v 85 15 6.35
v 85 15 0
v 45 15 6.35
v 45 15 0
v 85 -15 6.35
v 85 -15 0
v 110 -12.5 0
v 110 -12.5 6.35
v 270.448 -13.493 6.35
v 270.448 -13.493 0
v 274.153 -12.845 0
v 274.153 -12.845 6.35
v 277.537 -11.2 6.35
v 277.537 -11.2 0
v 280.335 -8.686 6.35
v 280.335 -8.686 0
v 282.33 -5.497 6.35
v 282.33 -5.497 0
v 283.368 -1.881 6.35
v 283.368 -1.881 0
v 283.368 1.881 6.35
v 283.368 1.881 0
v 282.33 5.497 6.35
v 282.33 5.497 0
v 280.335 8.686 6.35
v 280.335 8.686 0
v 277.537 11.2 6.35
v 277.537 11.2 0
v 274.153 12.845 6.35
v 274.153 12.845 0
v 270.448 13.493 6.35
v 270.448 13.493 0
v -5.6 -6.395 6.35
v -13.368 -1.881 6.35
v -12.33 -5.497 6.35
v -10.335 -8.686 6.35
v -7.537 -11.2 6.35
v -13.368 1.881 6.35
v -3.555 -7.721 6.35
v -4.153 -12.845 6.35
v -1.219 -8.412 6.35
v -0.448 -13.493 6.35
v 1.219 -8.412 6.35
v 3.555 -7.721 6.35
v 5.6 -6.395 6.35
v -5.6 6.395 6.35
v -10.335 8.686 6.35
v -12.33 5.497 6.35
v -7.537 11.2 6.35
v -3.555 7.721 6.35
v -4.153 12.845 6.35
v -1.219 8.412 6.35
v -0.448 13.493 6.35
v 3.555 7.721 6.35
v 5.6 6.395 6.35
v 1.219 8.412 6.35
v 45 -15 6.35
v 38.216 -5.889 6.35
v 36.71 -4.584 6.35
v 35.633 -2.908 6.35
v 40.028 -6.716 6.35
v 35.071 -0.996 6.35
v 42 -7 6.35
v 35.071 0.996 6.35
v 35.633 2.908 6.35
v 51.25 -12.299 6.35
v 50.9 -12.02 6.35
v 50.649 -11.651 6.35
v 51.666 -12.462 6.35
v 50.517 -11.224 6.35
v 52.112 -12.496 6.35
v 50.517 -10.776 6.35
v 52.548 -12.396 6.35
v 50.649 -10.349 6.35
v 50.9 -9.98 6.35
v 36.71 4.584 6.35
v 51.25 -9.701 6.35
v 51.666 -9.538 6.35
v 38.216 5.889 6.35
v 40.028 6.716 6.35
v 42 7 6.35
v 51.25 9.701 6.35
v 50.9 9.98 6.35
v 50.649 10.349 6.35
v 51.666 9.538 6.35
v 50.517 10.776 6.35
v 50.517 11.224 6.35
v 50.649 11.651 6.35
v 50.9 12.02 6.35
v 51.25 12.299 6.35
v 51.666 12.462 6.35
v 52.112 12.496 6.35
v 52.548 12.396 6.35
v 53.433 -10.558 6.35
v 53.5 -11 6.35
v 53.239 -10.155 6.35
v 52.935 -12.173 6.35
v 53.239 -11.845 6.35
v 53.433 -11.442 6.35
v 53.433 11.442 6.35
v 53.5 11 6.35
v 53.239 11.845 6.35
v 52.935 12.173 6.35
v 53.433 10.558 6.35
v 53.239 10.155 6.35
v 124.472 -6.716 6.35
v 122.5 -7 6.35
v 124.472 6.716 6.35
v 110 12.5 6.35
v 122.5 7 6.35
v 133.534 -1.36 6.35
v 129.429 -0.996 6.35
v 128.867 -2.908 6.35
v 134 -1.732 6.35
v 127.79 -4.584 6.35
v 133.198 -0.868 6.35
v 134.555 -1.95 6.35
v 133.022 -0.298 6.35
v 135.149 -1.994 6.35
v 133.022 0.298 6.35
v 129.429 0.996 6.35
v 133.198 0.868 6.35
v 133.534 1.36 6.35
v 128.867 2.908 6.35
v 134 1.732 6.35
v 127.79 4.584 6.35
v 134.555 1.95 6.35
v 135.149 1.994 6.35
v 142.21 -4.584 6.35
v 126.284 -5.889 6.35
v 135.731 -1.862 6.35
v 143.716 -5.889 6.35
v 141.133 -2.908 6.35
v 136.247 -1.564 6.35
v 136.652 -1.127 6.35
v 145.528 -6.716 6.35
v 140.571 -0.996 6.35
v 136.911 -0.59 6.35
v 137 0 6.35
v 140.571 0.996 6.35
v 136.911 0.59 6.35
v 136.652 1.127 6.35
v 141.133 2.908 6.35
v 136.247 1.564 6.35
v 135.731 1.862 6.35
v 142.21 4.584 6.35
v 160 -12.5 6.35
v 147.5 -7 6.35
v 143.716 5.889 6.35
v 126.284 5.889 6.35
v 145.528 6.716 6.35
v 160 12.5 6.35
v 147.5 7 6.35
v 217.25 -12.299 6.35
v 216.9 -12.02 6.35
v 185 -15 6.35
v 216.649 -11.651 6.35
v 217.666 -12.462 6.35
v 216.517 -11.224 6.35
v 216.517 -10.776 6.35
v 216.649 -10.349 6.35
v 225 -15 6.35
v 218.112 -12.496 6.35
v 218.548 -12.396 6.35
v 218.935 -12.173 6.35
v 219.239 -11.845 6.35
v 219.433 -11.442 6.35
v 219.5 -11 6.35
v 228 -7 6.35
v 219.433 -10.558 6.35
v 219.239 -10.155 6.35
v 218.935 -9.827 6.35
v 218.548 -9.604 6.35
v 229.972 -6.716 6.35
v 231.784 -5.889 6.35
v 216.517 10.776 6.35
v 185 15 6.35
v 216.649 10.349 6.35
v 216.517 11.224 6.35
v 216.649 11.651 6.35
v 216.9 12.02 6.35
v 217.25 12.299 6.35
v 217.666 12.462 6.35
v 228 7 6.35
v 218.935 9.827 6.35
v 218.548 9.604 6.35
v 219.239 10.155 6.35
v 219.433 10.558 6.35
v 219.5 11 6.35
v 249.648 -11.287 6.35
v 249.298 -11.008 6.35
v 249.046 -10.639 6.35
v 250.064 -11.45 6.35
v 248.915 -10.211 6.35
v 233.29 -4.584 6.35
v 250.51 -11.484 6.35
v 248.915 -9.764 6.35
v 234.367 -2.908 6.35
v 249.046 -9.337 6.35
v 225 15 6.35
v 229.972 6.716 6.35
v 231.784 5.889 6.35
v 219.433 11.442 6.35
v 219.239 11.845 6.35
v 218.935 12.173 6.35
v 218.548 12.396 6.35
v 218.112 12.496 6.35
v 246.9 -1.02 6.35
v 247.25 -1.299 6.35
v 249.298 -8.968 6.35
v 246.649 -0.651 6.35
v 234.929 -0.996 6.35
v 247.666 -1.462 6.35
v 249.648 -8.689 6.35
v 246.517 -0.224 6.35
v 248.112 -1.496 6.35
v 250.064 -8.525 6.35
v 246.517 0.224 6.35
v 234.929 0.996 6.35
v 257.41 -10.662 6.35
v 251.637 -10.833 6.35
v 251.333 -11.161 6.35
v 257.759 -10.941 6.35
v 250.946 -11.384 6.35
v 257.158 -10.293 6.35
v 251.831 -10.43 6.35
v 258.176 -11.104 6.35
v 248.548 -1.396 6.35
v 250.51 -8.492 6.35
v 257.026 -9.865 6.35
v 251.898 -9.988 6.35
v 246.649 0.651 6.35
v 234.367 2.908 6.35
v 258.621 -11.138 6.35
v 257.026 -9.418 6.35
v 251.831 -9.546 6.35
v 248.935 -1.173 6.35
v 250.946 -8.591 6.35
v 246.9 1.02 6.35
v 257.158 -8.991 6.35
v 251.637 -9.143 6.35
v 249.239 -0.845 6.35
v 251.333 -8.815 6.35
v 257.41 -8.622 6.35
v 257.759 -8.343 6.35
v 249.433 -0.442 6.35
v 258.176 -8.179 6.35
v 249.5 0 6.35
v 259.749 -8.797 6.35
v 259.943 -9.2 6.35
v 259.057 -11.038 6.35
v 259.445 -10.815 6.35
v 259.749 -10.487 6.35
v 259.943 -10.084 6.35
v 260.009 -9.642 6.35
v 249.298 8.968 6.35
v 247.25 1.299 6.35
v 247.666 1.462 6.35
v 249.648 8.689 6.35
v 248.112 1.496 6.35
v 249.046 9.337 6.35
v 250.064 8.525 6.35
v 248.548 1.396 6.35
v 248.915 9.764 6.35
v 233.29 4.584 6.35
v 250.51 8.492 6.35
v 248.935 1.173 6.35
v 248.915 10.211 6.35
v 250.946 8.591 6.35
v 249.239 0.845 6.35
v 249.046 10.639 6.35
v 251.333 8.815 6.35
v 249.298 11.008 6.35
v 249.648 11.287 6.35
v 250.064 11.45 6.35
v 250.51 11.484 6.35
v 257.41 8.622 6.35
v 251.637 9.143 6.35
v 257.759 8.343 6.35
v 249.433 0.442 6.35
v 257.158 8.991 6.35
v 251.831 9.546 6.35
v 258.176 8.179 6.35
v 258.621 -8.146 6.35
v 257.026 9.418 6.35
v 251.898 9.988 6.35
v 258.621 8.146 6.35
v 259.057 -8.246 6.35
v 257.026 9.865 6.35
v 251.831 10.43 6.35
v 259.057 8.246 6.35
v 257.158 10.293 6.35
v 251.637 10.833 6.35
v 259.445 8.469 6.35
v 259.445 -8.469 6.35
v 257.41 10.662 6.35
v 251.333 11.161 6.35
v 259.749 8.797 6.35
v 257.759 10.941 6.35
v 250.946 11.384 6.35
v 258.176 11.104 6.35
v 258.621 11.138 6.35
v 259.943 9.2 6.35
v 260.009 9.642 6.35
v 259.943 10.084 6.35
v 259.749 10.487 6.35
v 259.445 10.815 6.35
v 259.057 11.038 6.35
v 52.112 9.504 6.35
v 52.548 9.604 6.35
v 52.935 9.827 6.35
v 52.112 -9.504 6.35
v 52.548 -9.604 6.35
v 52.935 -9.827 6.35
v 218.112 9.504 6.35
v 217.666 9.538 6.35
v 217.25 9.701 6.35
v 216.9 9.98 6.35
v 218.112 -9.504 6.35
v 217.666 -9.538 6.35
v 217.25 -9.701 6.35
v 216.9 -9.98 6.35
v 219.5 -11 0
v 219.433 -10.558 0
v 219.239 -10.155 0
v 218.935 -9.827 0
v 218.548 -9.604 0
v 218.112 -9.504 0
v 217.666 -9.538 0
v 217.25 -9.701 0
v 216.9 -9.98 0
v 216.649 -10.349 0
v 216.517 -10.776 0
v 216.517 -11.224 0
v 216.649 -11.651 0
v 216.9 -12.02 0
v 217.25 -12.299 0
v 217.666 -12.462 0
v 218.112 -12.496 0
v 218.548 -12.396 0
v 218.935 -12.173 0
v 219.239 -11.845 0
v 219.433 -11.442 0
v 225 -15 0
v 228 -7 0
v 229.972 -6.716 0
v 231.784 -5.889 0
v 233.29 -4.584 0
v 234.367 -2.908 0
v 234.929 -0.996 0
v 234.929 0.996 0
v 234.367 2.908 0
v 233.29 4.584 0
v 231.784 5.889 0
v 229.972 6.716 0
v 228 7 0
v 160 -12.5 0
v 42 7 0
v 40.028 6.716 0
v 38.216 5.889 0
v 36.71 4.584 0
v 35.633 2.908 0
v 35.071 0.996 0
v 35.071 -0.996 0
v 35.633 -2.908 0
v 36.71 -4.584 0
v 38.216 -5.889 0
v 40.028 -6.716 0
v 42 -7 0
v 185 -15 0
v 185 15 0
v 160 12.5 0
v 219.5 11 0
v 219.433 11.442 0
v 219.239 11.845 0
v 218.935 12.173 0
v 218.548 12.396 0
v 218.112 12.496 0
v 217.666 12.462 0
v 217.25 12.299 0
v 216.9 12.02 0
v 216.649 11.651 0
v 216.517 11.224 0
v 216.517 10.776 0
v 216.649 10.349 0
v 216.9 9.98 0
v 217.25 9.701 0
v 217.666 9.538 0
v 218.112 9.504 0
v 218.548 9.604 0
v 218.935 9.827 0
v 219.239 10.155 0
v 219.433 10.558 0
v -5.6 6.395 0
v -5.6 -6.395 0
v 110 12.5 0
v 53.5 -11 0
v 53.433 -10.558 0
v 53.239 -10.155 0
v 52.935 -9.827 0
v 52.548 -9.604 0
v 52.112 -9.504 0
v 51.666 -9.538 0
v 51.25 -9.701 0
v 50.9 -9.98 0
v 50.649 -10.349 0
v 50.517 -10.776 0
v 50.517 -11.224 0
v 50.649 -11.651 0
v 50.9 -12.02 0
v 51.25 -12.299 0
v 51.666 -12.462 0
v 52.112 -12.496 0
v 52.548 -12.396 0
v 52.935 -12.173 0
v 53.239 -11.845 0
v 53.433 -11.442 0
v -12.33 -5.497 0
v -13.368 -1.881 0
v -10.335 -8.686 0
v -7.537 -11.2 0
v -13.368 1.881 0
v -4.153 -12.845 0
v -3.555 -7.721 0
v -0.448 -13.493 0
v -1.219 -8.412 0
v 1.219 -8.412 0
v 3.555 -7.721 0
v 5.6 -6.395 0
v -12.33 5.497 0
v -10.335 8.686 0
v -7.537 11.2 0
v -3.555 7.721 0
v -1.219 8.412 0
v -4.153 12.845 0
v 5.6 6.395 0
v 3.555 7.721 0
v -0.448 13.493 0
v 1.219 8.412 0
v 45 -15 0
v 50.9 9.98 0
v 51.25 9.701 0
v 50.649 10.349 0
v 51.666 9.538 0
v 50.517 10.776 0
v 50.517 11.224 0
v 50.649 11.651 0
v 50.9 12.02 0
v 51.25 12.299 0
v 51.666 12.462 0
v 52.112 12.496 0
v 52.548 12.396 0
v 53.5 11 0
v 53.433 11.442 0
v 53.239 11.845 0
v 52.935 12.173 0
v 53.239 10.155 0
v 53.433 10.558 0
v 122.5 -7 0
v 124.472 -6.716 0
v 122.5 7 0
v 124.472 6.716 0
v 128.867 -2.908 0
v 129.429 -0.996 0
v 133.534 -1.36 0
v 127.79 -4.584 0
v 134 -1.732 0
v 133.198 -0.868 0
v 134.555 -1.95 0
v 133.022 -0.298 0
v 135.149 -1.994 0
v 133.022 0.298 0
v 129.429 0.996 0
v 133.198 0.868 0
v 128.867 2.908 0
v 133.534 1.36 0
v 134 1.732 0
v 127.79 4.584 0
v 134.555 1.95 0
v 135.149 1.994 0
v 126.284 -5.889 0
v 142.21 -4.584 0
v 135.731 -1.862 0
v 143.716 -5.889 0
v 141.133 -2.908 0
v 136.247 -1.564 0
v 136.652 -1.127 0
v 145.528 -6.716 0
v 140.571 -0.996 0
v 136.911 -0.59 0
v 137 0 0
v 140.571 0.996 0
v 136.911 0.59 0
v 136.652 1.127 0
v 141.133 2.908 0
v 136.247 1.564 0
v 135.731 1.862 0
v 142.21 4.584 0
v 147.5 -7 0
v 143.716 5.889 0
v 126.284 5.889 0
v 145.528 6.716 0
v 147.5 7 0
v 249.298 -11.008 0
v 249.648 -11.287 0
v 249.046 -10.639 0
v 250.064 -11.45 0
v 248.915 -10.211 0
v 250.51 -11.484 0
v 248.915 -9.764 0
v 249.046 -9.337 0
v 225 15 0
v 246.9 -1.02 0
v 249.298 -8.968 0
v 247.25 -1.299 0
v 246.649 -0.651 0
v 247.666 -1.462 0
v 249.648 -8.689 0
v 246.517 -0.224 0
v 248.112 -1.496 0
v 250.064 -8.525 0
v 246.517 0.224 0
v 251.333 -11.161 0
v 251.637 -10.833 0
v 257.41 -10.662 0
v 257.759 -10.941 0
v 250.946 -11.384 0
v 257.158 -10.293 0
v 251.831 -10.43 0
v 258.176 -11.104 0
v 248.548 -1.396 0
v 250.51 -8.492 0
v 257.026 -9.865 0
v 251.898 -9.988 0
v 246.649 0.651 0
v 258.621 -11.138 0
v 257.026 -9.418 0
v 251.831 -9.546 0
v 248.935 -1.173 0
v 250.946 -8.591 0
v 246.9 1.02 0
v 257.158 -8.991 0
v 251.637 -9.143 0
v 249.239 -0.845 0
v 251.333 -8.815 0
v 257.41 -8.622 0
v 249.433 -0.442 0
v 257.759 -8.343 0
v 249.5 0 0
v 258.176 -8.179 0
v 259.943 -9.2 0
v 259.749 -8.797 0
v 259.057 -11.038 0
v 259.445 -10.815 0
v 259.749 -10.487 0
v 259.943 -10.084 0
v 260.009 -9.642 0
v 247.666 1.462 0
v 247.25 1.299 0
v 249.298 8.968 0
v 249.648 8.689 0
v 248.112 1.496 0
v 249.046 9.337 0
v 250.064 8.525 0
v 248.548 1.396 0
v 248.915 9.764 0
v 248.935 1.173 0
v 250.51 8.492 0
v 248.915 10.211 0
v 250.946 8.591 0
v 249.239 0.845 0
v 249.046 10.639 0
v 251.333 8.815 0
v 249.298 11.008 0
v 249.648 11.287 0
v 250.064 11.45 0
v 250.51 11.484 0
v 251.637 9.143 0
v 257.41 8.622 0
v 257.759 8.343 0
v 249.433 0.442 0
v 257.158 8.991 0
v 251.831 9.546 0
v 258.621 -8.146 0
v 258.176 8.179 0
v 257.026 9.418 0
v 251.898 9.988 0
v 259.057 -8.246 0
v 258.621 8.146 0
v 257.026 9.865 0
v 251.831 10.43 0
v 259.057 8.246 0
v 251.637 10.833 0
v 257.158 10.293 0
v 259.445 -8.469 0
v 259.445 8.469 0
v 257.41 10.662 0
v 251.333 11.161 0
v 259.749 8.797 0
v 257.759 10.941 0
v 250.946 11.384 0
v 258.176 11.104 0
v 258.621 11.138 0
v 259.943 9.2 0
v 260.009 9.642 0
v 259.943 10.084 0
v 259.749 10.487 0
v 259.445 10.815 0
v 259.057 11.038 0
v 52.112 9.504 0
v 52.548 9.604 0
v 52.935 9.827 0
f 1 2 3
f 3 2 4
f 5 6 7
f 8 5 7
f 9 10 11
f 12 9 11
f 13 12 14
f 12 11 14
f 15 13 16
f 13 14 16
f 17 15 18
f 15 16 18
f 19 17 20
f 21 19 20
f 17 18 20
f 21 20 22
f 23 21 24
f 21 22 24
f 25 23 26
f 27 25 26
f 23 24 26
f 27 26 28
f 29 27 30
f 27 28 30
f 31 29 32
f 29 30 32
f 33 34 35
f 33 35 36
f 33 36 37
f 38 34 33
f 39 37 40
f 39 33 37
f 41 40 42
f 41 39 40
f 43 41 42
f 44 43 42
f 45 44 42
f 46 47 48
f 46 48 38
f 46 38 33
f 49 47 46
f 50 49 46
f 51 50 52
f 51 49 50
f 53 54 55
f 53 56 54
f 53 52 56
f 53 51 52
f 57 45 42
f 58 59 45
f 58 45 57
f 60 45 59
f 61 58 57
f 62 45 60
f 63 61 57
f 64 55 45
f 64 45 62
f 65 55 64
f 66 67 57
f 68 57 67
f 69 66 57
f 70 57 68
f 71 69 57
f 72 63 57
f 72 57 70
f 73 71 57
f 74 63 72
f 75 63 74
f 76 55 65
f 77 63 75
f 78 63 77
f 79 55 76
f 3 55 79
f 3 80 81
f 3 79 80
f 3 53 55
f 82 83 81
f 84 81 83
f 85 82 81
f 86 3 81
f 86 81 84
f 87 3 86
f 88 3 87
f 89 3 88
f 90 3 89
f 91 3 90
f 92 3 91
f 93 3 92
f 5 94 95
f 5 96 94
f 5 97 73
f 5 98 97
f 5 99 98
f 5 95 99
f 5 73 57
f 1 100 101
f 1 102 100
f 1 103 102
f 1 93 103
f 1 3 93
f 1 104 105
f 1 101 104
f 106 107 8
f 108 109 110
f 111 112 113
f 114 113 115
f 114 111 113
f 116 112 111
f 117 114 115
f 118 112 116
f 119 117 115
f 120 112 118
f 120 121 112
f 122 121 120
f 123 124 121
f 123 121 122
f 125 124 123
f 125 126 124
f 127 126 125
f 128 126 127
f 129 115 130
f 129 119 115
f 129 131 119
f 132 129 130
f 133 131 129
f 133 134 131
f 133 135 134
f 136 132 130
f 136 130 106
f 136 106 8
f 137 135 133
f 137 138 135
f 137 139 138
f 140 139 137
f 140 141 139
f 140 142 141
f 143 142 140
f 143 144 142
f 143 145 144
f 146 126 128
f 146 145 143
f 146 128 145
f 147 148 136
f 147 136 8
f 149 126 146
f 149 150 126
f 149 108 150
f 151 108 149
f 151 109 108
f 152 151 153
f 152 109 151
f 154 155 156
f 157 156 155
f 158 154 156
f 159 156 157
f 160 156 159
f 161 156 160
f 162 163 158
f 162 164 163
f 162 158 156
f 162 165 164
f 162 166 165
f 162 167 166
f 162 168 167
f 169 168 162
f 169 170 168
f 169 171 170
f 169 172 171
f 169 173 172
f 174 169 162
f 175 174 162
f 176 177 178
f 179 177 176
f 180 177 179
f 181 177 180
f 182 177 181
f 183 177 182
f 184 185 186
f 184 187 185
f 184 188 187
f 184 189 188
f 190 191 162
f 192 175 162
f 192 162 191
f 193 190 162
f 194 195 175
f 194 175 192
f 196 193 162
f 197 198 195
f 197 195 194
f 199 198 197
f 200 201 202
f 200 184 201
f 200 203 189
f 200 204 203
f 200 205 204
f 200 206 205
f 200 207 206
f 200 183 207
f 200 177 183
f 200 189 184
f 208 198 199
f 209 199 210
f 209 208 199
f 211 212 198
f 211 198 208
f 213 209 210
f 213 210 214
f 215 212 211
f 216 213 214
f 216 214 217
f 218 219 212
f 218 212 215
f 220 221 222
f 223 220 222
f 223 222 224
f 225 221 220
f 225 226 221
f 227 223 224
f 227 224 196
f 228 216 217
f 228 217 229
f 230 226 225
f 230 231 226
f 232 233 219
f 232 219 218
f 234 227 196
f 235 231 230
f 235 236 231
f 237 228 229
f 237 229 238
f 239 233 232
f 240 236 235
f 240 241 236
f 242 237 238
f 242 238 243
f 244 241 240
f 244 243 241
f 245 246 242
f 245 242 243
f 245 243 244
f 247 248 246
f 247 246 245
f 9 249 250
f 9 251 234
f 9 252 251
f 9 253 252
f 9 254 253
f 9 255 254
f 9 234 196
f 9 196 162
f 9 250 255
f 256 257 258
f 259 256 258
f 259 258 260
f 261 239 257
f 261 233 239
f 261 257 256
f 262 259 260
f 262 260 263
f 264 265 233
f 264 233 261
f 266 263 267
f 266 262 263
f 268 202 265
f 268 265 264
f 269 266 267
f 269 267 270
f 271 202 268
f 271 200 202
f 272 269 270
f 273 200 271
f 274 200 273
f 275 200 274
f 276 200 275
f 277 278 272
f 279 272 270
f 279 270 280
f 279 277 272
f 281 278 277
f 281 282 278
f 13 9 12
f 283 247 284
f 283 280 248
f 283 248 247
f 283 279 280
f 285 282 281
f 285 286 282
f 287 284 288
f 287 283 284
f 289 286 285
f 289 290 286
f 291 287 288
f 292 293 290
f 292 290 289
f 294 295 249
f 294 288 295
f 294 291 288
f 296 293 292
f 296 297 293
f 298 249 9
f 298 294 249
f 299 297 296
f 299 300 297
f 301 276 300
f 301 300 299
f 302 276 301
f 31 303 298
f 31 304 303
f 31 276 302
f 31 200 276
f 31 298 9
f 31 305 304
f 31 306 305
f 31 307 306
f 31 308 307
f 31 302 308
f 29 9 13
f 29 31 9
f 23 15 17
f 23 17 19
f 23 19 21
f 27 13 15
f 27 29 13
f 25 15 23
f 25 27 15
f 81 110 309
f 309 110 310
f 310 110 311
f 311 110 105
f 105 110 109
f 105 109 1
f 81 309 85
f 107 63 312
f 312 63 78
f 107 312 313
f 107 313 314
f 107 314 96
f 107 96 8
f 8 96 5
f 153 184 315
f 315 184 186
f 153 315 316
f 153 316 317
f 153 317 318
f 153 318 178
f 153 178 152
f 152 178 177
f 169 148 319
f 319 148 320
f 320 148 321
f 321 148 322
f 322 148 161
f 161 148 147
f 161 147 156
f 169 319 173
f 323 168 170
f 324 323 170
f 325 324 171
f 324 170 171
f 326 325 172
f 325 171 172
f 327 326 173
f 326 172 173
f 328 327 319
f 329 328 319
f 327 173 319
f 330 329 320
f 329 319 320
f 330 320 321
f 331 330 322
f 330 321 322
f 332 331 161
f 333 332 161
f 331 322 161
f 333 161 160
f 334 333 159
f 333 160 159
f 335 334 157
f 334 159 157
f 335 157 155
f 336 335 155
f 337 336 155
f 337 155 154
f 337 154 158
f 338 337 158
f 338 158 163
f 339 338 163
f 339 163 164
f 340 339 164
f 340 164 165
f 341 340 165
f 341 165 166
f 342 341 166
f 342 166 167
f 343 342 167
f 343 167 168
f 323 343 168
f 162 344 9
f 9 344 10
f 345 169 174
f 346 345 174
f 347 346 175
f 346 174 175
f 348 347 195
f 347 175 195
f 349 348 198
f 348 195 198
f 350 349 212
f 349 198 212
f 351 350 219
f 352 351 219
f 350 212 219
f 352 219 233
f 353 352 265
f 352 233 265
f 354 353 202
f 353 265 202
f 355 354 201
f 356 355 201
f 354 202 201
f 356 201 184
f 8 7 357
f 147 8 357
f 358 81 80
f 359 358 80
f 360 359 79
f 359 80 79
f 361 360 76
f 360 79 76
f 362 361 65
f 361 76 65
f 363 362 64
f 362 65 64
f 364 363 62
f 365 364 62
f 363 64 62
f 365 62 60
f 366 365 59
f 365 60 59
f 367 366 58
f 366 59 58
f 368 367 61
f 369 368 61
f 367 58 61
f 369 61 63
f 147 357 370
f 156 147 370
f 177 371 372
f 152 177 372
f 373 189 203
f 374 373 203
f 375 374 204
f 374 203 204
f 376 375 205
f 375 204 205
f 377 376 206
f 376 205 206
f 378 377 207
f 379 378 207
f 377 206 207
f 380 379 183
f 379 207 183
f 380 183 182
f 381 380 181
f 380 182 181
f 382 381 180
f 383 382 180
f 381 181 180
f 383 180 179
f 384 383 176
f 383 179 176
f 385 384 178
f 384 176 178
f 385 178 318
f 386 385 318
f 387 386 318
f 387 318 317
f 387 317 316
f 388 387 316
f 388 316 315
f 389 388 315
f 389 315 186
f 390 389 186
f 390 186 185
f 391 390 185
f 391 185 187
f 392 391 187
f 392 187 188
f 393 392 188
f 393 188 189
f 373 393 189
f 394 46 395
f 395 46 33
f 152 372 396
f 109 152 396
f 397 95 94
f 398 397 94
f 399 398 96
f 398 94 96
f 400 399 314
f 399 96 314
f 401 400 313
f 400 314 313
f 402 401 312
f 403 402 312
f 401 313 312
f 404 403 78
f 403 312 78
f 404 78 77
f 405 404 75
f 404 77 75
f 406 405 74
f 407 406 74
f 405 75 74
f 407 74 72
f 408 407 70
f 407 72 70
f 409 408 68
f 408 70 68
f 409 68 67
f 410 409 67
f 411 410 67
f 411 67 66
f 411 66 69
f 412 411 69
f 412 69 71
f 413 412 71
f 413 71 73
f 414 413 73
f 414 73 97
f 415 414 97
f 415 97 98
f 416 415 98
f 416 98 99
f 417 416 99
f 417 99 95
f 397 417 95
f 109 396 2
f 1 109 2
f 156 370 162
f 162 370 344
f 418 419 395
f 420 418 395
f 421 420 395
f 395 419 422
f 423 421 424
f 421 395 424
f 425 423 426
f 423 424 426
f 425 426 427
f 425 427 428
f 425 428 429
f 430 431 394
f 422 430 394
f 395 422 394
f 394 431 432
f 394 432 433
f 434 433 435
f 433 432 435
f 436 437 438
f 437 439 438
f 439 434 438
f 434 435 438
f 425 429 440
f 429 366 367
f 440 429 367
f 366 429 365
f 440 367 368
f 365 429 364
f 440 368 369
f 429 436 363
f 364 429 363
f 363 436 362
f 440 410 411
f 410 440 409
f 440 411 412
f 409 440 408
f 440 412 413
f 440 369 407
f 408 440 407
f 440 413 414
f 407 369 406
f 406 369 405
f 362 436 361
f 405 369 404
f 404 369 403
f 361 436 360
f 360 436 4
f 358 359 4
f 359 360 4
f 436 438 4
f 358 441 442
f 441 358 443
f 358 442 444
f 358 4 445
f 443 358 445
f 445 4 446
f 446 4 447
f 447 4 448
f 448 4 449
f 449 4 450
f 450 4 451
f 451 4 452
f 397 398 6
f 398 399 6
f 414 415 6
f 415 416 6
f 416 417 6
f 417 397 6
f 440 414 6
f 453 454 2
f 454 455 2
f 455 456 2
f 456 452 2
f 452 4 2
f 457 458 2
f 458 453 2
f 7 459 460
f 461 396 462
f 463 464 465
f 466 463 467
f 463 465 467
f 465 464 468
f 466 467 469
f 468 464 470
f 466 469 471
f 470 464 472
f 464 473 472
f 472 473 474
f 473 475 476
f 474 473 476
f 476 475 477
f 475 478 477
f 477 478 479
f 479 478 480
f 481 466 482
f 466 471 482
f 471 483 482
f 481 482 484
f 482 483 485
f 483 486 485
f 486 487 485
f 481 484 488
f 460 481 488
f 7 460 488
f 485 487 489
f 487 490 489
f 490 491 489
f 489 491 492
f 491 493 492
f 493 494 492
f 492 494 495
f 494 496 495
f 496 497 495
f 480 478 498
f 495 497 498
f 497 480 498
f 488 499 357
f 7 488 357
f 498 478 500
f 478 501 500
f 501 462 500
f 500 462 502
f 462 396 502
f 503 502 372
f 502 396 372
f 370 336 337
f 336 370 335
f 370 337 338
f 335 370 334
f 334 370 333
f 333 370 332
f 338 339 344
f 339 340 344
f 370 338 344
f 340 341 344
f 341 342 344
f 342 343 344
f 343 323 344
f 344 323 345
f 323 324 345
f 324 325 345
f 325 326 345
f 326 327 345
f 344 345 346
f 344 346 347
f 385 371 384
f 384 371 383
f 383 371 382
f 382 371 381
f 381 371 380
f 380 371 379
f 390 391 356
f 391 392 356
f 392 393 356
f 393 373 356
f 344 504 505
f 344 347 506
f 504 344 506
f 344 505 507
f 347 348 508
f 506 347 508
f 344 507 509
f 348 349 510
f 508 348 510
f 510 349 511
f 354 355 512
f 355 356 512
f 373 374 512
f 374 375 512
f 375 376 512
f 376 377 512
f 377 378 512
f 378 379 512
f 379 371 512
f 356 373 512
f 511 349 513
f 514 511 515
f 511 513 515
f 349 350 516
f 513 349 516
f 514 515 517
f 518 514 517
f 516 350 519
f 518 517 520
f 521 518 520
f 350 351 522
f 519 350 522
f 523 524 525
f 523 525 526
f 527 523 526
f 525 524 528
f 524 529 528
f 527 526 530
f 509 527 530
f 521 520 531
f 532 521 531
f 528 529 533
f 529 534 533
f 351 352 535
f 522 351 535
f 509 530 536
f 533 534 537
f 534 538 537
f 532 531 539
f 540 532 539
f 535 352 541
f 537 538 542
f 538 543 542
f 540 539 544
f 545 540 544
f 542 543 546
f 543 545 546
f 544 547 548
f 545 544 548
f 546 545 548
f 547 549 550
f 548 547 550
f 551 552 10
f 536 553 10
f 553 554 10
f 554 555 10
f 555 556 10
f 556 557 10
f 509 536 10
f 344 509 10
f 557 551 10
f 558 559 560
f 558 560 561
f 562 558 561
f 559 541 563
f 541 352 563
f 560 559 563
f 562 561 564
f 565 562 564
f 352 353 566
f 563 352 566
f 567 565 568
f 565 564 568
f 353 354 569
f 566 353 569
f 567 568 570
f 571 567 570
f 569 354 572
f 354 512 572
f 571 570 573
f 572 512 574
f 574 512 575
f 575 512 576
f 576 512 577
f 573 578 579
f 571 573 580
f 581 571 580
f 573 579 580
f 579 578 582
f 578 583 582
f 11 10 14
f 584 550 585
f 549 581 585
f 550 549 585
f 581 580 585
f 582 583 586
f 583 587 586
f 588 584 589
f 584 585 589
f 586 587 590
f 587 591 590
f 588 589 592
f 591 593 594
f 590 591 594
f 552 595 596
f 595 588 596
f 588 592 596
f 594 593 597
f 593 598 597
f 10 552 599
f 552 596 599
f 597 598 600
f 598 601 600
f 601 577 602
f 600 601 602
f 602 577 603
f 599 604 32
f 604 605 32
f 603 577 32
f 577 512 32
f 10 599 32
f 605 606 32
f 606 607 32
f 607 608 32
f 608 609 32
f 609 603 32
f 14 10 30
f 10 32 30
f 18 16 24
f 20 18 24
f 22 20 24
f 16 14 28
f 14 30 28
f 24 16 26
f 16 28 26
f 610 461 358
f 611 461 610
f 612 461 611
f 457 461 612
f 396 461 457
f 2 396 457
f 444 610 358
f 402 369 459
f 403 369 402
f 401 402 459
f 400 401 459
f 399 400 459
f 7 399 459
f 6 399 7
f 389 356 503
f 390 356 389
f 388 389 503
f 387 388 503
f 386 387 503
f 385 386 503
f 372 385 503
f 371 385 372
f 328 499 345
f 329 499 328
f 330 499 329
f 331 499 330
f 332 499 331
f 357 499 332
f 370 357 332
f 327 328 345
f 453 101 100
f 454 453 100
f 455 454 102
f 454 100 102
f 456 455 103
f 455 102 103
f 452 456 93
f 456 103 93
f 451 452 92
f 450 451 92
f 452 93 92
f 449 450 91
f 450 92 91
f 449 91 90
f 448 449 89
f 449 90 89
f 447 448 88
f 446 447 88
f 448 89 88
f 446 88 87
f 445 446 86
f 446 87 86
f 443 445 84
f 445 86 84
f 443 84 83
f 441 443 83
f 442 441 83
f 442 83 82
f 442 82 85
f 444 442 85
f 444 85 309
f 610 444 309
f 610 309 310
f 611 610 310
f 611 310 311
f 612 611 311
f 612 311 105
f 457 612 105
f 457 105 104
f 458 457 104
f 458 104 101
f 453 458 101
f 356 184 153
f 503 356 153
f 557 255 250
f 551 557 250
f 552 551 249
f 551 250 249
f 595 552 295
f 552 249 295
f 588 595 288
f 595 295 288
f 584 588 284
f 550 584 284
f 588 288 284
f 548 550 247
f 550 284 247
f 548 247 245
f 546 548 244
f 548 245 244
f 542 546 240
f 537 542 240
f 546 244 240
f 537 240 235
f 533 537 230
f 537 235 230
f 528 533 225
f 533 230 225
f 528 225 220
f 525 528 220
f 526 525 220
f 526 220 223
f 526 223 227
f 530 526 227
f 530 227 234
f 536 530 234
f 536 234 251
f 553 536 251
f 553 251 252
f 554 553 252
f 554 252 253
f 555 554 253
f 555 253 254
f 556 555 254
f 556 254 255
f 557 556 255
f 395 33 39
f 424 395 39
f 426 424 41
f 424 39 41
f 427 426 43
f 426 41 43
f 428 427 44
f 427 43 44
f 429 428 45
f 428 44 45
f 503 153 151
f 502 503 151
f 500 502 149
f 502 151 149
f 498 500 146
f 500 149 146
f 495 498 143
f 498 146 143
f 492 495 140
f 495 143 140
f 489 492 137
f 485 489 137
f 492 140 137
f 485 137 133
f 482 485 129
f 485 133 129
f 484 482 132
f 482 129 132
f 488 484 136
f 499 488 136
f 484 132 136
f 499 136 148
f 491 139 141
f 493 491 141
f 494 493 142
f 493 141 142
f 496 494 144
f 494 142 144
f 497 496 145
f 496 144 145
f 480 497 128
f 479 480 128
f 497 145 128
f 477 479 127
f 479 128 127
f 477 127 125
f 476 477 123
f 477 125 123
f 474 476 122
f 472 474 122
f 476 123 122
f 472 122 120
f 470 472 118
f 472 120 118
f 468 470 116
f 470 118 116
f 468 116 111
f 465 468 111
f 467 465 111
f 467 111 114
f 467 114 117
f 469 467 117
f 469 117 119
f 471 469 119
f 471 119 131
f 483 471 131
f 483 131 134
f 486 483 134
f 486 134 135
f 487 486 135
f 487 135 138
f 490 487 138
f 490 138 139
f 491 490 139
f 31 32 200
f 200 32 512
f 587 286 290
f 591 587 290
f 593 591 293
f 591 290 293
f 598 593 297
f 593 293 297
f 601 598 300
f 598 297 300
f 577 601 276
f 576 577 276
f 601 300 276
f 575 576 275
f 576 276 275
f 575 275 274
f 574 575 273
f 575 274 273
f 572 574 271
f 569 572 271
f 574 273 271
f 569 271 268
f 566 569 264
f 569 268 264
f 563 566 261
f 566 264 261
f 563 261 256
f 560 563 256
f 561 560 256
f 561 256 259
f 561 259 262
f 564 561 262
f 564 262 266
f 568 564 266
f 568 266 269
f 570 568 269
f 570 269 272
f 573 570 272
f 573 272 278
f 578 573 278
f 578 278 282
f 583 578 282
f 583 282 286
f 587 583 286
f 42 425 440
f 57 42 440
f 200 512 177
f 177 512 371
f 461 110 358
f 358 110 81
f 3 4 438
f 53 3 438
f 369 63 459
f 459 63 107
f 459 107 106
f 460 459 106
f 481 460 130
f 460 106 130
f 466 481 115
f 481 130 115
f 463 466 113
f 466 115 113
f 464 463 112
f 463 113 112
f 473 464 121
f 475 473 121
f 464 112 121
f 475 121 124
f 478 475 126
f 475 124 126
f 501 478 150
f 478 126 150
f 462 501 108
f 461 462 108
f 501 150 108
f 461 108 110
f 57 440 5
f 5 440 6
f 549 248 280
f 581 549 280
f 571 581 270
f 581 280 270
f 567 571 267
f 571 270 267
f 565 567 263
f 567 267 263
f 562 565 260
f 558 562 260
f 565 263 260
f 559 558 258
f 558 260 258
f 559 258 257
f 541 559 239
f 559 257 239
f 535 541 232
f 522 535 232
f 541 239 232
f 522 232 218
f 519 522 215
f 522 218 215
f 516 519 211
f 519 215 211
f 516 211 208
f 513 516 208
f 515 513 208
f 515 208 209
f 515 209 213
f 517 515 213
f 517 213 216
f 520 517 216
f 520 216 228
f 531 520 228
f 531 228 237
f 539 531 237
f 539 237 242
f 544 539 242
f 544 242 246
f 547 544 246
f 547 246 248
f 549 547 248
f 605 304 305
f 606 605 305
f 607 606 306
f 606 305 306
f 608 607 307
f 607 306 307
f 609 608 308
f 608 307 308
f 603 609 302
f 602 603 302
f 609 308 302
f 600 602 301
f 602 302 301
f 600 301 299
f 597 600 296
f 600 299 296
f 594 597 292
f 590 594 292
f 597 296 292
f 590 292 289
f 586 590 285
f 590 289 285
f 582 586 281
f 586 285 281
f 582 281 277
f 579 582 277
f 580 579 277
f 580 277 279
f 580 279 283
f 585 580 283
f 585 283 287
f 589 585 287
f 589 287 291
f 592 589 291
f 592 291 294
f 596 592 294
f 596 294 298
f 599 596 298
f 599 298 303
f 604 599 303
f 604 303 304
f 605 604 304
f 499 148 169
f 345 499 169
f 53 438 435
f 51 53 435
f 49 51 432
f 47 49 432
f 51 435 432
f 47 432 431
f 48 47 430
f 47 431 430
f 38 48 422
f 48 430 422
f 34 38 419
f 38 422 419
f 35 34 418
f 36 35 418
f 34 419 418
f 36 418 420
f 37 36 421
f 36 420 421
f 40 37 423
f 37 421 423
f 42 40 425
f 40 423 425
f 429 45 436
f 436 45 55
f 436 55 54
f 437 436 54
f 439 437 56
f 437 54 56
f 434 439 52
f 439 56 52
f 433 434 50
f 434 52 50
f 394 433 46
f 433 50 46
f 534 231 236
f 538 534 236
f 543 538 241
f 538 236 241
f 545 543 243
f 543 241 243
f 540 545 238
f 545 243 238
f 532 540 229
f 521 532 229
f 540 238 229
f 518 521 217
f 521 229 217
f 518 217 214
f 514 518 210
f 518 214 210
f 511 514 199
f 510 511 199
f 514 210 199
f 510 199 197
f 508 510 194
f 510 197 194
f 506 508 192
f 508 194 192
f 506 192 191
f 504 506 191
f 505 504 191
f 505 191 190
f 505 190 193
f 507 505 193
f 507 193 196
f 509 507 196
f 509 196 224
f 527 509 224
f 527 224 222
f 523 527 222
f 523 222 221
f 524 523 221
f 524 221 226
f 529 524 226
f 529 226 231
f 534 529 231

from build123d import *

# Parameters (mm, degrees)
CROQUIS1_R              = 13.5
SALIENTE_EXTRUIR1_DEPTH = 6.35
CORTAR_EXTRUIR1_DEPTH   = 6.35
CORTAR_EXTRUIR3_DEPTH   = 10
CROQUIS4_R              = 1.5
CROQUIS4_R_2            = 2
CORTAR_EXTRUIR4_DEPTH   = 10
CROQUIS5_R              = 1.5
CORTAR_EXTRUIR5_DEPTH   = 7.35
CROQUIS6_R              = 1.5
CORTAR_EXTRUIR6_DEPTH   = 7.35


with BuildPart() as part:
    # Croquis1 → Saliente-Extruir1 (new body)
    with BuildSketch(Plane.XY):
        Circle(CROQUIS1_R)
        with BuildLine():
            Line((85, 15), (45, 15))
            Line((45, 15), (-0.447526726, 13.492580177))
            ThreePointArc((-0.447526726, 13.492580177), (9.386383468, 9.702876141), (13.5, 0))
            ThreePointArc((13.5, 0), (9.386383468, -9.702876141), (-0.447526726, -13.492580177))
            Line((-0.447526726, -13.492580177), (45, -15))
            Line((45, -15), (85, -15))
            Line((85, -15), (110, -12.5))
            Line((110, -12.5), (160, -12.5))
            Line((160, -12.5), (185, -15))
            Line((185, -15), (225, -15))
            Line((225, -15), (270.447526726, -13.492580177))
            ThreePointArc((270.447526726, -13.492580177), (256.5, 0), (270.447526726, 13.492580177))
            Line((270.447526726, 13.492580177), (225, 15))
            Line((225, 15), (185, 15))
            Line((185, 15), (160, 12.5))
            Line((160, 12.5), (110, 12.5))
            Line((110, 12.5), (85, 15))
        make_face()
        with Locations((270, 0)):
            Circle(CROQUIS1_R)
    extrude(amount=SALIENTE_EXTRUIR1_DEPTH)

    # Croquis2 → Cortar-Extruir1 (cut)
    with BuildSketch(Plane.XY.offset(6.35)):
        with BuildLine():
            ThreePointArc((5.6, 6.394528911), (0, 8.5), (-5.6, 6.394528911))
            Line((-5.6, 6.394528911), (-5.6, -6.394528911))
            ThreePointArc((-5.6, -6.394528911), (0, -8.5), (5.6, -6.394528911))
            Line((5.6, -6.394528911), (5.6, 6.394528911))
        make_face()
    extrude(amount=-CORTAR_EXTRUIR1_DEPTH, mode=Mode.SUBTRACT)

    # Croquis3 → Cortar-Extruir3 (cut)
    with BuildSketch(Plane.XY.offset(6.35)):
        with BuildLine():
            Line((122.5, 7), (42, 7))
            ThreePointArc((42, 7), (35, 0), (42, -7))
            Line((42, -7), (122.5, -7))
            ThreePointArc((122.5, -7), (129.5, 0), (122.5, 7))
        make_face()
        with BuildLine():
            Line((228, 7), (147.5, 7))
            ThreePointArc((147.5, 7), (140.5, 0), (147.5, -7))
            Line((147.5, -7), (228, -7))
            ThreePointArc((228, -7), (235, 0), (228, 7))
        make_face()
    extrude(amount=-CORTAR_EXTRUIR3_DEPTH, mode=Mode.SUBTRACT)

    # Croquis4 → Cortar-Extruir4 (cut)
    with BuildSketch(Plane.XY.offset(6.35)):
        with Locations((52, 11)):
            Circle(CROQUIS4_R)
        with Locations((52, -11)):
            Circle(CROQUIS4_R)
        with Locations((218, -11)):
            Circle(CROQUIS4_R)
        with Locations((218, 11)):
            Circle(CROQUIS4_R)
        with Locations((135, 0)):
            Circle(CROQUIS4_R_2)
    extrude(amount=-CORTAR_EXTRUIR4_DEPTH, mode=Mode.SUBTRACT)

    # Croquis5 → Cortar-Extruir5 (cut, through all)
    with BuildSketch(Plane.XY.offset(6.35)):
        with Locations((248, 0)):
            Circle(CROQUIS5_R)
    extrude(amount=-CORTAR_EXTRUIR5_DEPTH, mode=Mode.SUBTRACT)

    # Croquis6 → Cortar-Extruir6 (cut, through all)
    with BuildSketch(Plane.XY.offset(6.35)):
        with Locations((250.397856468, 9.987790994)):
            Circle(CROQUIS6_R)
        with Locations((258.509333353, 9.641814145)):
            Circle(CROQUIS6_R)
        with Locations((258.509333353, -9.641814145)):
            Circle(CROQUIS6_R)
        with Locations((250.397856468, -9.987790994)):
            Circle(CROQUIS6_R)
    extrude(amount=-CORTAR_EXTRUIR6_DEPTH, mode=Mode.SUBTRACT)


solid = part.part
